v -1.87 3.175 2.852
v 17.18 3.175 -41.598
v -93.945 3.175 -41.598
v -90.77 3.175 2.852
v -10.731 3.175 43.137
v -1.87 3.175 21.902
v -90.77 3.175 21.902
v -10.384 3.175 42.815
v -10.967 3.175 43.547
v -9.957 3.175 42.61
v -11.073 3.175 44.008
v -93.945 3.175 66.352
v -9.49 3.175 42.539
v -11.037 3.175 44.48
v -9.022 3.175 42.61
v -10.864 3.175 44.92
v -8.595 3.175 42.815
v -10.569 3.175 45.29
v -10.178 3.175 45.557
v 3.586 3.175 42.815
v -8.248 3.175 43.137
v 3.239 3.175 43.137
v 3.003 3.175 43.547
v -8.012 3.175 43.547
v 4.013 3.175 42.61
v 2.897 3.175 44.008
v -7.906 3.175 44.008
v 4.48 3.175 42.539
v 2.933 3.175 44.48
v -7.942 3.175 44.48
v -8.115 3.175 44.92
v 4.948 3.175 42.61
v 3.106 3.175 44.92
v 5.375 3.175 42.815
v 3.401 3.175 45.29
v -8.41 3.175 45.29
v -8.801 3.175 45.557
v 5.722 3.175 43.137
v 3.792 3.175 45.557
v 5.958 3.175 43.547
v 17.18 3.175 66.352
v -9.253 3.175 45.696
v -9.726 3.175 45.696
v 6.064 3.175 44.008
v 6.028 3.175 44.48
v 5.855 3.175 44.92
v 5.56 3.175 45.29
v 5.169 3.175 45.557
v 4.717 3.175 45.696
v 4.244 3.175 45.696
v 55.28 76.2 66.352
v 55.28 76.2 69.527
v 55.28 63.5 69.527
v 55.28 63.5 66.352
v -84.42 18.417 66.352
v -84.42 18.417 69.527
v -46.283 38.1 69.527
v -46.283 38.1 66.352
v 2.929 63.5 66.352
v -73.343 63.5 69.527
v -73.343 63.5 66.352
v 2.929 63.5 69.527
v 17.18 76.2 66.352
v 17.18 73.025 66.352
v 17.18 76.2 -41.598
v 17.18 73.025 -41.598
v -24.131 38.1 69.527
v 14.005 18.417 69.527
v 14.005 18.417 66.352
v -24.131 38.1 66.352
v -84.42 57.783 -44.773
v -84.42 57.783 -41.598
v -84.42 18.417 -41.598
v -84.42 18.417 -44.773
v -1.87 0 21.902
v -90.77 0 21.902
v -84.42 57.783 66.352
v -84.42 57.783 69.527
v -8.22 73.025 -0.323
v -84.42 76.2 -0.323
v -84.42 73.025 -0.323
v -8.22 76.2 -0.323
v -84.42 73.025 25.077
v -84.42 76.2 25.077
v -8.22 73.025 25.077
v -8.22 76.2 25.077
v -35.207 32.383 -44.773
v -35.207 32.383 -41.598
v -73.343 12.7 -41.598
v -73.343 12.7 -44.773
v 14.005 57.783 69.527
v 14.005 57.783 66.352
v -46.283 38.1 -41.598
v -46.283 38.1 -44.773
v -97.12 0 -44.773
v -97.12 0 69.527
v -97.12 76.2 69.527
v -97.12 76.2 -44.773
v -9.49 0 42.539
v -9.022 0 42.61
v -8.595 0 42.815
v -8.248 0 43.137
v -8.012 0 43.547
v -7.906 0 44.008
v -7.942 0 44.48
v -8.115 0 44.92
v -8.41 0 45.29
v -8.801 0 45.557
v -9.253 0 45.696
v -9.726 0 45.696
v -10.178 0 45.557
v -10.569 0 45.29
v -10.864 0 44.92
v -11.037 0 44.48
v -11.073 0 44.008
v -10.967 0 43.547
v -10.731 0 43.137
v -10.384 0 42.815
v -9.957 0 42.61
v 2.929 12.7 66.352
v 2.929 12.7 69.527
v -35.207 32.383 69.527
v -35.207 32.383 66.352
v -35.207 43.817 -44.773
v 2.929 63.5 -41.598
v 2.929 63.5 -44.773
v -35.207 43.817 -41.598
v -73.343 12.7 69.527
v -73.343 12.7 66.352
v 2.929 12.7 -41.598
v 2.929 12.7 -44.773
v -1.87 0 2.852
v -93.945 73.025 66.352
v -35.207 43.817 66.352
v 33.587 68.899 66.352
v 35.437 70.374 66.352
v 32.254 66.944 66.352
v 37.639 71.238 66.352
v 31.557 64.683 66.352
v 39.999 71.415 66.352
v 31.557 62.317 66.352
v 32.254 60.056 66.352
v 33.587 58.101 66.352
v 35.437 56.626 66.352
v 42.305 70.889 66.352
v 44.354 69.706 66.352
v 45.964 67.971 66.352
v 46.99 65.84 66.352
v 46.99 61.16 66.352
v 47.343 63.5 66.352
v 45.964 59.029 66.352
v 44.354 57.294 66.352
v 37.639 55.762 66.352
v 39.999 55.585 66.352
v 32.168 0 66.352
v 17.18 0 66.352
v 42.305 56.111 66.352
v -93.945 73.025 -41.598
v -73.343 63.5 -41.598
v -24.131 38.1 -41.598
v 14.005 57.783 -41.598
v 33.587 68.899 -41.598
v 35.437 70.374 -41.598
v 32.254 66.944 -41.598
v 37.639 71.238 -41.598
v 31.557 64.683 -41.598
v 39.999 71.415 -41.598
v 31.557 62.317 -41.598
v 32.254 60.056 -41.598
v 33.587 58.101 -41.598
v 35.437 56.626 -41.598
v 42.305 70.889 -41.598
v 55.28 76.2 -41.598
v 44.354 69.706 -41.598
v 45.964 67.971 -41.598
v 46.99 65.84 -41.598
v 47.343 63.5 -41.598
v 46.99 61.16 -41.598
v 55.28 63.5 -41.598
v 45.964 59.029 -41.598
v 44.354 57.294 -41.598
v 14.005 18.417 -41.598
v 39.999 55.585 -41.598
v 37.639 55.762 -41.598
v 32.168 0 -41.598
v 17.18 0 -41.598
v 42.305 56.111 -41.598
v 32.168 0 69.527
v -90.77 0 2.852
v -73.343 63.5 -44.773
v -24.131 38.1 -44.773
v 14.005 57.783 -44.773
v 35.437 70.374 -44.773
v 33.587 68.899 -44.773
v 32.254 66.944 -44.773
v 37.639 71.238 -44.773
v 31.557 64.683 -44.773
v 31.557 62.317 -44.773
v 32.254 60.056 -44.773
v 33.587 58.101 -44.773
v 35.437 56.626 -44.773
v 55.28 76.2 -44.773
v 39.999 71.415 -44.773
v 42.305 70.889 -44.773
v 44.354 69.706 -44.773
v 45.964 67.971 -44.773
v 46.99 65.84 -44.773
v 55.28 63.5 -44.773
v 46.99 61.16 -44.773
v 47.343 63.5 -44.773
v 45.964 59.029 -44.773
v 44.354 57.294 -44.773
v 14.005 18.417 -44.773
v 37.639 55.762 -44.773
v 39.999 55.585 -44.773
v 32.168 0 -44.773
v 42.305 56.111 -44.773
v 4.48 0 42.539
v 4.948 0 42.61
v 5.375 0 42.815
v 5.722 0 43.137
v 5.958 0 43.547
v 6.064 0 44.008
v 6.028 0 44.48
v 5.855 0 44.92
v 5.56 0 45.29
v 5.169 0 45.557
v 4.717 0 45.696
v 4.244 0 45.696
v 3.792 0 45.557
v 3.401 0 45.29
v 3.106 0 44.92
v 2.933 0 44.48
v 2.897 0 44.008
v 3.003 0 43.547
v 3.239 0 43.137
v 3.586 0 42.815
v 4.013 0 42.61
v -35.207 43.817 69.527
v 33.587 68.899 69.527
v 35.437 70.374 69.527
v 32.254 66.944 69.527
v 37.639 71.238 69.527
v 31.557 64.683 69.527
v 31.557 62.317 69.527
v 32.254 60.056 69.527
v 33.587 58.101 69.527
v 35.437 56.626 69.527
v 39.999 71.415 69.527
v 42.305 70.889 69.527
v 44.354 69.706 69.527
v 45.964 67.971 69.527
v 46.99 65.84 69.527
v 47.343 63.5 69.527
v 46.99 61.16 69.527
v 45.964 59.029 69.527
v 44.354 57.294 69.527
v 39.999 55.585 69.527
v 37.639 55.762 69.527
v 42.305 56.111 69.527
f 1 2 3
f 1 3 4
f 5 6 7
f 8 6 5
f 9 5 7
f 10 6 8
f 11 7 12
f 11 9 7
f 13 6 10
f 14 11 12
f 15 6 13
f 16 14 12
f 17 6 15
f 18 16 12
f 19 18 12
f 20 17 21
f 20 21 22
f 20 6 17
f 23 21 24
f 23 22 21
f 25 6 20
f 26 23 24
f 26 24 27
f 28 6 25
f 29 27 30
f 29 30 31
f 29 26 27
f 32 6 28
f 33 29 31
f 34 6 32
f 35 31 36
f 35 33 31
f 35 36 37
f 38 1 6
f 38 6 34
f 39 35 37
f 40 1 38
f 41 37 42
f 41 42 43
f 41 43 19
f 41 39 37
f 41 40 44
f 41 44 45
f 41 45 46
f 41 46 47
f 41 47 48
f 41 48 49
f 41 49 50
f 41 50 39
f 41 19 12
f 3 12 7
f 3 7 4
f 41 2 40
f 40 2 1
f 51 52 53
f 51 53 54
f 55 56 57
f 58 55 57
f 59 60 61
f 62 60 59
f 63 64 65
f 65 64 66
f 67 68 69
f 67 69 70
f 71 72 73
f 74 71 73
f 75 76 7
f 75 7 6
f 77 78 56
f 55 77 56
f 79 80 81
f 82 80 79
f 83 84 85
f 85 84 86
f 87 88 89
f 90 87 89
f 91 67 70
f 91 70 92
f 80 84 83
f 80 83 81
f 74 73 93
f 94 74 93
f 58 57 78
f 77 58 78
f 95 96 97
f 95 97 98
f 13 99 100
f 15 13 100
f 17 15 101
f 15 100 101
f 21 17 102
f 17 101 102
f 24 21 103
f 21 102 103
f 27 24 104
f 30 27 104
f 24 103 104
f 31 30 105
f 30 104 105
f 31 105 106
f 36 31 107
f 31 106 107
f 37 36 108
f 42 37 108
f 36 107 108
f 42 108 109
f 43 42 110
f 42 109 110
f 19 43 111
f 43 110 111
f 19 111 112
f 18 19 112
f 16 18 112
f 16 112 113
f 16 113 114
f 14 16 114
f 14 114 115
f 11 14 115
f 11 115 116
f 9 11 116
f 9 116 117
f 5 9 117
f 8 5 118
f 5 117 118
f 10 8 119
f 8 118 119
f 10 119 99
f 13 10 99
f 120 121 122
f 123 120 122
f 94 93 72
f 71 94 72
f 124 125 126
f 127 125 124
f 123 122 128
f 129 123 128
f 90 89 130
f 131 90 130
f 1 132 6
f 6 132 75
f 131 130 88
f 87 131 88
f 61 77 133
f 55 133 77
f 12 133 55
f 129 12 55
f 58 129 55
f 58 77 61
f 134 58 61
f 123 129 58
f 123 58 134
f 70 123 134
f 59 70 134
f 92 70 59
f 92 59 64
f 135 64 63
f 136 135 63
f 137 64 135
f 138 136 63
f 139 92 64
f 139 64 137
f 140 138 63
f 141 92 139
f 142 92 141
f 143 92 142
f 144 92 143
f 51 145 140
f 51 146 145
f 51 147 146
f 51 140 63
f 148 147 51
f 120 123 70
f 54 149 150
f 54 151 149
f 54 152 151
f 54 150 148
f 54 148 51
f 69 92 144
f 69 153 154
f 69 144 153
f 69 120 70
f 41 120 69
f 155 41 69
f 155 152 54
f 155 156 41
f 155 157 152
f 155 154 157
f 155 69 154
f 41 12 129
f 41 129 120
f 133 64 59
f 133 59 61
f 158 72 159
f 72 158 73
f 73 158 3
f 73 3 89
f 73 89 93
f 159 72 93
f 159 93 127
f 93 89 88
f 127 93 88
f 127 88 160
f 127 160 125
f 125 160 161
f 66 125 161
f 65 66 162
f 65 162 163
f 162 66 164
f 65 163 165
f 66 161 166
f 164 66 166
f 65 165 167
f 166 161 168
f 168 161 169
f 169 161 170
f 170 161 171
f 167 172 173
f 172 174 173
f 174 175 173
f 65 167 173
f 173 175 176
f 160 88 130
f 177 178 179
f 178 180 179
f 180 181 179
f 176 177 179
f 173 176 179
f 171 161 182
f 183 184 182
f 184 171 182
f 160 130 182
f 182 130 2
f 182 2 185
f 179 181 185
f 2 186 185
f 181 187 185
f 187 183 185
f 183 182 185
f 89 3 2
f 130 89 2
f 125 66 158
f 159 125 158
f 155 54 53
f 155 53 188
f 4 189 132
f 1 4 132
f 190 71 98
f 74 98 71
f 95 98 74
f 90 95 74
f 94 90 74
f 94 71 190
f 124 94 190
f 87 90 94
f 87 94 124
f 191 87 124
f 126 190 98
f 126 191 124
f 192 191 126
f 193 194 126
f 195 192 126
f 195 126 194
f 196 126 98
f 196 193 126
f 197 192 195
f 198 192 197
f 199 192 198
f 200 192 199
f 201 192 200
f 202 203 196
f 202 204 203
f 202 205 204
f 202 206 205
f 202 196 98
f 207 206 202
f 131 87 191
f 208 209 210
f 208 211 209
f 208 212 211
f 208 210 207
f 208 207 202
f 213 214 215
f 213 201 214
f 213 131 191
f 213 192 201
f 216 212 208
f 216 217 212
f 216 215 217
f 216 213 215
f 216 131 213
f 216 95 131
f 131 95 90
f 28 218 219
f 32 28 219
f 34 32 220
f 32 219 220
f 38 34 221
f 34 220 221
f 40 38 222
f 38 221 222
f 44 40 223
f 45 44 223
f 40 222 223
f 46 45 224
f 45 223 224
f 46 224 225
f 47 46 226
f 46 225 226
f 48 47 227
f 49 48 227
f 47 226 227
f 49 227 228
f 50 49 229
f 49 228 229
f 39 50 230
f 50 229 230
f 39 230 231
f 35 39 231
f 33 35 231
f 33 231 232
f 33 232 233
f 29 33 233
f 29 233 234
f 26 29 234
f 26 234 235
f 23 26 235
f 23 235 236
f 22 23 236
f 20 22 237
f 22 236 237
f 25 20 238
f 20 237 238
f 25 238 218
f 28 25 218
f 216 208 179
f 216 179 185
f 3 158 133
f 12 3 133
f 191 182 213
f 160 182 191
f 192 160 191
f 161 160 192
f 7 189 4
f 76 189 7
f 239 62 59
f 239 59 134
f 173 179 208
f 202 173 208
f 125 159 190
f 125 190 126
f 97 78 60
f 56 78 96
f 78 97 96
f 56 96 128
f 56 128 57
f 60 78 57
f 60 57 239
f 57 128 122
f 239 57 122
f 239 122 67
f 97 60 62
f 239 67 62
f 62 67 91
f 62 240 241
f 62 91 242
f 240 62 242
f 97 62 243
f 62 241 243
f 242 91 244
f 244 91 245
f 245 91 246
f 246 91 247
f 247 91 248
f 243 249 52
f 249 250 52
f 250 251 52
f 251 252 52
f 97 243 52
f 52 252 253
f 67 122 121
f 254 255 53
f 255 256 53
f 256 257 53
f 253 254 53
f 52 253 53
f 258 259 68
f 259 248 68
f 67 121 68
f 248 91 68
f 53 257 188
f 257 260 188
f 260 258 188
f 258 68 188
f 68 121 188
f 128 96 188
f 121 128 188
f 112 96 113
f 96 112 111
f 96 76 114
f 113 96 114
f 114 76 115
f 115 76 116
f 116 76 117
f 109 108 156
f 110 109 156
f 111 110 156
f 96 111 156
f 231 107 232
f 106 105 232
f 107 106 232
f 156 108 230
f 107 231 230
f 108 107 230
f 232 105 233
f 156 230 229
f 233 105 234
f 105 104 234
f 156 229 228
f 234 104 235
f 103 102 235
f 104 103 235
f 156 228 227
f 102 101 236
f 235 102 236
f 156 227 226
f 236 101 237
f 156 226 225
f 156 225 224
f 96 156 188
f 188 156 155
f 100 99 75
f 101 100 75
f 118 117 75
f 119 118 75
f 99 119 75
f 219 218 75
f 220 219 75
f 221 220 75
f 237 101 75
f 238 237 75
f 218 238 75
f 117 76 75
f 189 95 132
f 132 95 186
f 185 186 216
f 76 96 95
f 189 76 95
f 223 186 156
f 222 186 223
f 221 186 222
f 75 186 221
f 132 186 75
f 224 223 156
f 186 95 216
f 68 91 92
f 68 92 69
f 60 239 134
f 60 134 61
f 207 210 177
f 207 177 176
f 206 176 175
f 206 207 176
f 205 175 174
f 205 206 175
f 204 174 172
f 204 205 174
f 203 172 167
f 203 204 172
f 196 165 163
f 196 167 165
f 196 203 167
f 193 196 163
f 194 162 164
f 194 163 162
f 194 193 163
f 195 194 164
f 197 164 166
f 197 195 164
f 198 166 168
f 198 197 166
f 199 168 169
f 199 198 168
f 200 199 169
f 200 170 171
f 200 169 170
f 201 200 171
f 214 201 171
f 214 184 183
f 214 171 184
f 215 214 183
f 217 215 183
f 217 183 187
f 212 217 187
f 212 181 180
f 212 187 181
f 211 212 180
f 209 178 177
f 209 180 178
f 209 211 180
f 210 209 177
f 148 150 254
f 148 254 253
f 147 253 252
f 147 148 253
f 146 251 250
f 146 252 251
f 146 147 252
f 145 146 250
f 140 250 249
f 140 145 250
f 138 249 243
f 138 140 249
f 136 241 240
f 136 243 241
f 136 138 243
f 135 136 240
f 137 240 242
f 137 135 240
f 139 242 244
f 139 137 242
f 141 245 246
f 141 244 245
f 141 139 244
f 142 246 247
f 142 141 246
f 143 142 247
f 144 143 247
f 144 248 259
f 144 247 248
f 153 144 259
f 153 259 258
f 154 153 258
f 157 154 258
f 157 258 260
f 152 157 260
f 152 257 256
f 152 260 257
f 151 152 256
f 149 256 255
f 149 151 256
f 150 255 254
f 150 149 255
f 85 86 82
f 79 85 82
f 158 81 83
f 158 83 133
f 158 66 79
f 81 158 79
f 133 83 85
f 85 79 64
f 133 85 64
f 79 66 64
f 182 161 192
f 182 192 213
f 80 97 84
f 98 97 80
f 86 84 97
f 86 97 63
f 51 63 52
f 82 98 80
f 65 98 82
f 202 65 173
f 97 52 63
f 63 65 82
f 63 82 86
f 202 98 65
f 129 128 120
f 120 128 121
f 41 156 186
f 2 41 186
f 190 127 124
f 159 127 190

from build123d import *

# Parameters (mm, degrees)
SKETCH1_W               = 152.4
SKETCH1_H               = 114.3
BOSS_EXTRUDE1_DEPTH     = 76.2
CUT_EXTRUDE1_DEPTH      = 142.677746119
CUT_EXTRUDE1_DEPTH_BACK = 142.677746119
SKETCH5_W               = 38.1
SKETCH5_H               = 107.95
CUT_EXTRUDE4_DEPTH      = 142.677746119
CUT_EXTRUDE5_DEPTH      = 169.235334824
CUT_EXTRUDE5_DEPTH_BACK = 169.235334824
SKETCH6_R               = 7.9375
CUT_EXTRUDE6_START      = -114.3
SKETCH8_W               = 107.95
SKETCH8_H               = 69.85
CUT_EXTRUDE6_DEPTH      = 111.125
SKETCH9_R               = 1.5875
CUT_EXTRUDE7_DEPTH      = 3.175
SKETCH10_W              = 88.9
SKETCH10_H              = 19.05
CUT_EXTRUDE8_DEPTH      = 5.715
CUT_EXTRUDE9_DEPTH      = 169.235334824
SKETCH13_W              = 76.2
SKETCH13_H              = 25.4
CUT_EXTRUDE10_DEPTH     = 5.715


with BuildPart() as part:
    # Sketch1 → Boss-Extrude1 (new body)
    with BuildSketch(Plane(origin=(0, 0, 0), x_dir=(1, 0, 0), z_dir=(0, 1, 0))):
        with Locations((-20.919503106, -12.376583851)):
            Rectangle(SKETCH1_W, SKETCH1_H)
    extrude(amount=BOSS_EXTRUDE1_DEPTH)

    # Sketch3 → Cut-Extrude1 (cut, two sides: drawn at the far end of the back side and taken through both)
    with BuildSketch(Plane.XY.offset(-CUT_EXTRUDE1_DEPTH_BACK)):
        Polygon((55.280496894, 63.5), (32.168387019, 0), (55.280496894, 0), align=None)
    extrude(amount=CUT_EXTRUDE1_DEPTH + CUT_EXTRUDE1_DEPTH_BACK, mode=Mode.SUBTRACT)

    # Sketch5 → Cut-Extrude4 (cut, through all)
    with BuildSketch(Plane(origin=(0, 0, 0), x_dir=(1, 0, 0), z_dir=(0, 1, 0))):
        with Locations((36.230496894, -12.376583851)):
            Rectangle(SKETCH5_W, SKETCH5_H)
    extrude(amount=CUT_EXTRUDE4_DEPTH, mode=Mode.SUBTRACT)

    # Sketch6 → Cut-Extrude5 (cut, two sides: drawn at the far end of the back side and taken through both)
    with BuildSketch(Plane.XY.offset(69.526583851).offset(-CUT_EXTRUDE5_DEPTH_BACK)):
        with Locations((39.405496894, 63.5)):
            Circle(SKETCH6_R)
    extrude(amount=CUT_EXTRUDE5_DEPTH + CUT_EXTRUDE5_DEPTH_BACK, mode=Mode.SUBTRACT)

    # Sketch8 → Cut-Extrude6 (cut)
    with BuildSketch(Plane.ZY.offset(97.119503106).offset(CUT_EXTRUDE6_START)):
        with Locations((12.376583851, 38.1)):
            Rectangle(SKETCH8_W, SKETCH8_H)
    extrude(amount=CUT_EXTRUDE6_DEPTH, mode=Mode.SUBTRACT)

    # Sketch9 → Cut-Extrude7 (cut)
    with BuildSketch(Plane.XZ):
        with Locations(Location((4.480496894, 44.126583851, 0), (0, 0, 270))):
            Circle(SKETCH9_R)
        with Locations(Location((-9.489503106, 44.126583851, 0), (0, 0, 270))):
            Circle(SKETCH9_R)
    extrude(amount=-CUT_EXTRUDE7_DEPTH, mode=Mode.SUBTRACT)

    # Sketch10 → Cut-Extrude8 (cut)
    with BuildSketch(Plane.XZ):
        with Locations((-46.319503106, 12.376583851)):
            Rectangle(SKETCH10_W, SKETCH10_H)
    extrude(amount=-CUT_EXTRUDE8_DEPTH, mode=Mode.SUBTRACT)

    # Sketch12 → Cut-Extrude9 (cut, through all)
    with BuildSketch(Plane.XY.offset(69.526583851)):
        Polygon((-73.343348256, 63.5), (2.929342045, 63.5), (-35.207003106, 43.816725084), align=None)
        Polygon((-84.419503106, 57.783274916), (-84.419503106, 18.416725084), (-46.283157955, 38.1), align=None)
        Polygon((-73.343348256, 12.7), (2.929342045, 12.7), (-35.207003106, 32.383274916), align=None)
        Polygon((14.005496894, 57.783274916), (14.005496894, 18.416725084), (-24.130848256, 38.1), align=None)
    extrude(amount=-CUT_EXTRUDE9_DEPTH, mode=Mode.SUBTRACT)

    # Sketch13 → Cut-Extrude10 (cut)
    with BuildSketch(Plane(origin=(0, 76.2, 0), x_dir=(1, 0, 0), z_dir=(0, 1, 0))):
        with Locations((-46.319503106, -12.376583851)):
            Rectangle(SKETCH13_W, SKETCH13_H)
    extrude(amount=-CUT_EXTRUDE10_DEPTH, mode=Mode.SUBTRACT)


solid = part.part
